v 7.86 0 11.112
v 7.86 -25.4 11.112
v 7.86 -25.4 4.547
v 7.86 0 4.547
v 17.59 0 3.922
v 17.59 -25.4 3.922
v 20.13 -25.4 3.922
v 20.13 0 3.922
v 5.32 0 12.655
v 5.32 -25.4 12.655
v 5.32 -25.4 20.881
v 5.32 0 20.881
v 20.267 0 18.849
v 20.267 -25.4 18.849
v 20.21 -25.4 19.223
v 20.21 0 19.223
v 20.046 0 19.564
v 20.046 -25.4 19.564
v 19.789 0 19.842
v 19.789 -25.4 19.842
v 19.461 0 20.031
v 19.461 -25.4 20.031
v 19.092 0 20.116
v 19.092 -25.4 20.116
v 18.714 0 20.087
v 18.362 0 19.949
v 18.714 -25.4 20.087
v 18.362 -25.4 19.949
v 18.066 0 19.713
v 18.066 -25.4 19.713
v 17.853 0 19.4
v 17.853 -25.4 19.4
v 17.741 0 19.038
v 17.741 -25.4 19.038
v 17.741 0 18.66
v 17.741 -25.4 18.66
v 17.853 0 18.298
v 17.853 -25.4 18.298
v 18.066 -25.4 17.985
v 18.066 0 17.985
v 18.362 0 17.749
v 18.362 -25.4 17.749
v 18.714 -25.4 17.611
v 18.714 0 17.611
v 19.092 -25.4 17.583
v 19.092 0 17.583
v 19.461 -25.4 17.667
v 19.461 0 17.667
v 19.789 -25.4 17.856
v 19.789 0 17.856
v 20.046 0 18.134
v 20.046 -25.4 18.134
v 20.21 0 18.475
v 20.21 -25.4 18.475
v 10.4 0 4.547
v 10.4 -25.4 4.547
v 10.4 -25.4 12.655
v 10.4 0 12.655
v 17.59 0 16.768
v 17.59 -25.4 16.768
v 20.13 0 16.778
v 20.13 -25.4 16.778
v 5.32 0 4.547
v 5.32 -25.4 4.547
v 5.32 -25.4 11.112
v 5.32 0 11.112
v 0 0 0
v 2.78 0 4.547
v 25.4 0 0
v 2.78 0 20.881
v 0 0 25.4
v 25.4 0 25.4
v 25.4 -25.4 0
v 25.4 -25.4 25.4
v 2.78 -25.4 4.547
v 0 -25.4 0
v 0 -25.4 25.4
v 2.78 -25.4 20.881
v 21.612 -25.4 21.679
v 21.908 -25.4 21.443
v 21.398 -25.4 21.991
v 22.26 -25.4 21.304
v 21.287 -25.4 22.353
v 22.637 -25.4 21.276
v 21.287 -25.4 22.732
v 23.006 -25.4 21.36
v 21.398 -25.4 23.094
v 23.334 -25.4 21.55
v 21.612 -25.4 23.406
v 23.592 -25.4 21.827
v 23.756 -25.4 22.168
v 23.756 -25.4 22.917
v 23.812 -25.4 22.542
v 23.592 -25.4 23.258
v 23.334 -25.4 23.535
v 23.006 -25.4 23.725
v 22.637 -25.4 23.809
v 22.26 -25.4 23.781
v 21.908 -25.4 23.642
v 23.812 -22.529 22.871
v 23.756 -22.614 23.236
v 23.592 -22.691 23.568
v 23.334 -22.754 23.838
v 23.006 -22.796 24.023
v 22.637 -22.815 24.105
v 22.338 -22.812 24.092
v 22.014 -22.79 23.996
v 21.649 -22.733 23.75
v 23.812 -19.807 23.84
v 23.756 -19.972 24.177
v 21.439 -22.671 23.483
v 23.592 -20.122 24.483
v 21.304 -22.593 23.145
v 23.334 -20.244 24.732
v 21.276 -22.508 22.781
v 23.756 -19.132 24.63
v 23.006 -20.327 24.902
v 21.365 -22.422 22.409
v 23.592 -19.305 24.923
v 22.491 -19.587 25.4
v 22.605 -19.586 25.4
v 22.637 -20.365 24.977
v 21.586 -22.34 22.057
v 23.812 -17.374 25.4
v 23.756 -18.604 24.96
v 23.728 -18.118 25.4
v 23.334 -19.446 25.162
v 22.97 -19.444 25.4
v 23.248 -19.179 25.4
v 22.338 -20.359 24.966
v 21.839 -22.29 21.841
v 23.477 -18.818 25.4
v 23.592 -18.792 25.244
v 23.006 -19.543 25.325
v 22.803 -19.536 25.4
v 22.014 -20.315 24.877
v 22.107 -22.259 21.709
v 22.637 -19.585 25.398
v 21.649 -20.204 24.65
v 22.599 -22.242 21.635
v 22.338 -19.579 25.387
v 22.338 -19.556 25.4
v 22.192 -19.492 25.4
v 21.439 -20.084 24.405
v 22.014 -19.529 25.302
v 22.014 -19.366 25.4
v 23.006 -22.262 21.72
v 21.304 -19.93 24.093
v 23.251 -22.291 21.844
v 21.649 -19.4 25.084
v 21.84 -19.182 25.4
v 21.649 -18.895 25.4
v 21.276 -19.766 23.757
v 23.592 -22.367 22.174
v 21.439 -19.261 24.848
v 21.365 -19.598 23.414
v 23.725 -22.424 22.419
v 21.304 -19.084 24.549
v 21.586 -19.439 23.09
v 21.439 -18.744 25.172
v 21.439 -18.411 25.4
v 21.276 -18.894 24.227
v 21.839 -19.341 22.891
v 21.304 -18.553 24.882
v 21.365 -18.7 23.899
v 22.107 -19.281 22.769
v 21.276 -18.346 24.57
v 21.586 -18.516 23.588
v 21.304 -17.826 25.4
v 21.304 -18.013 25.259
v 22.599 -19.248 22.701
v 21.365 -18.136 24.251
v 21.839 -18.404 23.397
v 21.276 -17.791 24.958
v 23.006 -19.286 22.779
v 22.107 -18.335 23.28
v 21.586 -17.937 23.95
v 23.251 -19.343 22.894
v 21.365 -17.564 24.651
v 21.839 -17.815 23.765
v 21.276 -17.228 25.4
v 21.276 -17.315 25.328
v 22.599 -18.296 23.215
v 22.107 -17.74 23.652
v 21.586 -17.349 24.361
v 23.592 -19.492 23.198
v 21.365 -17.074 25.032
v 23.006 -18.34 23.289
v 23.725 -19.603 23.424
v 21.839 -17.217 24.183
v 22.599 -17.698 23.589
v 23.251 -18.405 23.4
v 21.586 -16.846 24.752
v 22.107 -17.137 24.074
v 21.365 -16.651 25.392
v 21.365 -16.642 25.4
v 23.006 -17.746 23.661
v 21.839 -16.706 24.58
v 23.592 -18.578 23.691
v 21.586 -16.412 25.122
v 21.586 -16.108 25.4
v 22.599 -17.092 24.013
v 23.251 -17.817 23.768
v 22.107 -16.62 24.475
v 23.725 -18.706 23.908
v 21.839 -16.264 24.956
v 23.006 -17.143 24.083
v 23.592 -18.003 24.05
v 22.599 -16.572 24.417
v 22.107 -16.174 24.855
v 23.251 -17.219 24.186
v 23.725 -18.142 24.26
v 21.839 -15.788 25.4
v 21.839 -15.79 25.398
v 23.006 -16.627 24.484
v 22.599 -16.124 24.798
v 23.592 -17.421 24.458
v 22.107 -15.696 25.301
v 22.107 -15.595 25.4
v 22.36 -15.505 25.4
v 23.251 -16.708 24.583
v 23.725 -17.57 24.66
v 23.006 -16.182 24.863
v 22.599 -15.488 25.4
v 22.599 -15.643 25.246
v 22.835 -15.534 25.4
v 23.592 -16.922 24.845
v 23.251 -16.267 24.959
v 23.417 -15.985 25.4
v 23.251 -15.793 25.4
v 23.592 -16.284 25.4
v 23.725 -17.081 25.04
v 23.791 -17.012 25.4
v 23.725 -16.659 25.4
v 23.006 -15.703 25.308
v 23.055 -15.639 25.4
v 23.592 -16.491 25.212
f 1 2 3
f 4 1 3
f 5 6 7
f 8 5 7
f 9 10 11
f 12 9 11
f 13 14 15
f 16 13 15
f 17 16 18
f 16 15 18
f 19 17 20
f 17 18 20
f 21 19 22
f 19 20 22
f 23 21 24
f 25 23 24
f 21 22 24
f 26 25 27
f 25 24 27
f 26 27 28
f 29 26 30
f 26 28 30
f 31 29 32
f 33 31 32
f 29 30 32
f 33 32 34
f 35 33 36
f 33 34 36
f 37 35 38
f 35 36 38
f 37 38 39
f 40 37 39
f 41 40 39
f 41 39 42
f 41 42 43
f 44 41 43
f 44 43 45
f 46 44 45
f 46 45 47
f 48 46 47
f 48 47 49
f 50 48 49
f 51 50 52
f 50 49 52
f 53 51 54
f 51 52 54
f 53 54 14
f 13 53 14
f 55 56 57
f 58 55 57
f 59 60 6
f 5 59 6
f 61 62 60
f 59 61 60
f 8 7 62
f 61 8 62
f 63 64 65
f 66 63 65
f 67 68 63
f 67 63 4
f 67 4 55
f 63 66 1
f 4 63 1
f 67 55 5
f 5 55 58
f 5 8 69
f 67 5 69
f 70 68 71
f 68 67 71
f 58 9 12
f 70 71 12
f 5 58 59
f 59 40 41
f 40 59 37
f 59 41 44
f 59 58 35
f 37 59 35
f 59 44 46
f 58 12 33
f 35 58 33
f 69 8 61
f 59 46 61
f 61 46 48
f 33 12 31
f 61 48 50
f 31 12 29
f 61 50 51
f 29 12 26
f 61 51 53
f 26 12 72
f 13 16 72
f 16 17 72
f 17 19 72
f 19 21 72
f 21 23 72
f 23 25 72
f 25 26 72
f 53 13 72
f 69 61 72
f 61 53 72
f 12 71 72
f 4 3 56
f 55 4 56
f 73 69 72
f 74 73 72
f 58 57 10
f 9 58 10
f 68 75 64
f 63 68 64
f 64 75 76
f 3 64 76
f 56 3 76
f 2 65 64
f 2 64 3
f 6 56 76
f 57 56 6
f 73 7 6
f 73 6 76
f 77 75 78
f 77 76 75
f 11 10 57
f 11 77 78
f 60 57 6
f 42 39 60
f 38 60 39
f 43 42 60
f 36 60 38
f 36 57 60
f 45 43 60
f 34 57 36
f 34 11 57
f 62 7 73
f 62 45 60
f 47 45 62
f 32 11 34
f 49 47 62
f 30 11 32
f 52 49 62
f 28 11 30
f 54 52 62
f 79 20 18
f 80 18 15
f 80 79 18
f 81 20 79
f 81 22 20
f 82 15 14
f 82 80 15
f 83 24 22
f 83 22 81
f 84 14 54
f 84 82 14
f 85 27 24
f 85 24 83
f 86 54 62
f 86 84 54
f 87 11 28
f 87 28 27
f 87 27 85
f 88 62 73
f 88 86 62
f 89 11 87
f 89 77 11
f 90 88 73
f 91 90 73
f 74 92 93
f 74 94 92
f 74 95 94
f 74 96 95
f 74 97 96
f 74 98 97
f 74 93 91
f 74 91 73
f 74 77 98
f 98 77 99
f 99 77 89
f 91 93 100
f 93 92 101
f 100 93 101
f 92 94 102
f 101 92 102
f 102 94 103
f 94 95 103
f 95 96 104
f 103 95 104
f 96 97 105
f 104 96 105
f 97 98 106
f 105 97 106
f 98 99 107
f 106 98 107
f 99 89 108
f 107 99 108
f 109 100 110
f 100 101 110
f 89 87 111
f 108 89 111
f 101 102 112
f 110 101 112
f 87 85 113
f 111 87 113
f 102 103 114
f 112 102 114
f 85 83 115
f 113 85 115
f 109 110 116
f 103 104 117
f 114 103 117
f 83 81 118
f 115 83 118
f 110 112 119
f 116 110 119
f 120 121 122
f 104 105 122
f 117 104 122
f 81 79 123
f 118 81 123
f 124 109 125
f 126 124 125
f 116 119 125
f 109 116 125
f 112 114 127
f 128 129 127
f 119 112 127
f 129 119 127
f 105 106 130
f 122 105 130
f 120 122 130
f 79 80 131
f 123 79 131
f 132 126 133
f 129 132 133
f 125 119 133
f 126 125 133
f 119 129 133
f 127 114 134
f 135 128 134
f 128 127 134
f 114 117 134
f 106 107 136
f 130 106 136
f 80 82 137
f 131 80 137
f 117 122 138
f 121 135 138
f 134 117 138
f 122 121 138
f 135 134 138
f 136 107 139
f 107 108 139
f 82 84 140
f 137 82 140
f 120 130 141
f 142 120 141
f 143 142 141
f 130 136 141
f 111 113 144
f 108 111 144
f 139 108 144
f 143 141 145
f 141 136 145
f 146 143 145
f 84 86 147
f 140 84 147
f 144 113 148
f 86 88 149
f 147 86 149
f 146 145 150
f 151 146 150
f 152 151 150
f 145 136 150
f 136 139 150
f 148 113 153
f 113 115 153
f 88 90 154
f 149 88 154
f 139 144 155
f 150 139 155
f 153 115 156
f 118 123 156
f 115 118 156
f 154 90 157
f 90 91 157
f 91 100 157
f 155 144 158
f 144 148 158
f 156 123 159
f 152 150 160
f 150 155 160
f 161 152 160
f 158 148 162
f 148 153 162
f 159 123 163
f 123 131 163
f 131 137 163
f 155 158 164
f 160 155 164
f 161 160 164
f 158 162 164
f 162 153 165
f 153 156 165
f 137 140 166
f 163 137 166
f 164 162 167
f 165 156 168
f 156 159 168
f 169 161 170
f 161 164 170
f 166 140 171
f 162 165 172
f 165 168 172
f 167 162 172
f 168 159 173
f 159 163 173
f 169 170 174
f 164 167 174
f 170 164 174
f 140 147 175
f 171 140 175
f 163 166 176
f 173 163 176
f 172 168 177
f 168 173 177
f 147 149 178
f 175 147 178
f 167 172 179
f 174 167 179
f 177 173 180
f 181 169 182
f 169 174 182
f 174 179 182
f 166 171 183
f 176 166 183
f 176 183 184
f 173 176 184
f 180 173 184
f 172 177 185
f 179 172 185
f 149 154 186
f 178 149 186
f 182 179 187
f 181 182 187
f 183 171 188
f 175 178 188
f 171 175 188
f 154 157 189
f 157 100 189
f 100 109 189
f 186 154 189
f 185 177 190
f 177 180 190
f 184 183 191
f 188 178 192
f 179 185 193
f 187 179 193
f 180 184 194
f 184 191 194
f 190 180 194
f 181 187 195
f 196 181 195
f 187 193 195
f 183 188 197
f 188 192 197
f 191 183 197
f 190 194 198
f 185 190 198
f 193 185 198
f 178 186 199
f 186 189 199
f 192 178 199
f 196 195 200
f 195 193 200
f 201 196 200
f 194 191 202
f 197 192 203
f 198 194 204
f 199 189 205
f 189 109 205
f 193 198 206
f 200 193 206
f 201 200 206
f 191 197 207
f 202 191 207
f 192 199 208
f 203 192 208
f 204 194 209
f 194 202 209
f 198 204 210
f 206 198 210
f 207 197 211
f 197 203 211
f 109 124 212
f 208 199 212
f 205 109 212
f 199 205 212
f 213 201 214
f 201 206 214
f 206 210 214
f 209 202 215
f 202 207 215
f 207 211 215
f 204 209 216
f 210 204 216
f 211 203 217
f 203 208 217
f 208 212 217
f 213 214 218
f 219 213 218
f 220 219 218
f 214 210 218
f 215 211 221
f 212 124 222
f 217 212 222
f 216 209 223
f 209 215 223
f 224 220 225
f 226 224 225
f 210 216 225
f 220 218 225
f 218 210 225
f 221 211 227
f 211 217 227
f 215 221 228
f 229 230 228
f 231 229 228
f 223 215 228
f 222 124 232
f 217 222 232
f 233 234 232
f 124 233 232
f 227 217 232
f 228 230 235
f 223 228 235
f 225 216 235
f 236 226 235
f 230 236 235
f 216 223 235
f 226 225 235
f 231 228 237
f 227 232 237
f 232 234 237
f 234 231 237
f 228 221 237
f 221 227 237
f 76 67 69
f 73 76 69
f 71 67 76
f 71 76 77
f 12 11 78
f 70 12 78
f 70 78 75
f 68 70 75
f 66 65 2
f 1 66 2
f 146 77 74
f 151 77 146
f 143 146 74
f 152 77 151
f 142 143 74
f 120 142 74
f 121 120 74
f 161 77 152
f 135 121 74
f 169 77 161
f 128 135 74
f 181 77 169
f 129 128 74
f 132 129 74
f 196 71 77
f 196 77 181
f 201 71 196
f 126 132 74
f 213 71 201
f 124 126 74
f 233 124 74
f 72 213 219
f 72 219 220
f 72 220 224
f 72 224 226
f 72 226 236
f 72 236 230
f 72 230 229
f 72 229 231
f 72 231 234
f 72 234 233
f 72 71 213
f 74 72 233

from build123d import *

# Parameters (mm, degrees)
F0_W     = 25.4
F0_H     = 25.4
F1_DEPTH = 25.4
F2_R     = 1.27
F3_DEPTH = 25.4
F4_R     = 1.27


with BuildPart() as f1:
    # F0 (on Front) → F1 (new body)
    with BuildSketch(Plane.XZ):
        with Locations((12.7, 12.7)):
            Rectangle(F0_W, F0_H)
    extrude(amount=F1_DEPTH)

    # F2 (on face) → F3 (cut)
    with BuildSketch(Plane.XZ.offset(25.4)):
        Polygon((10.399874, 12.655389), (5.319874, 12.655389), (5.319874, 20.881082), (4.538336, 20.881082), (2.779874, 20.881082), (2.779874, 4.546927), (4.538336, 4.546927), (5.319874, 4.546927), (5.319874, 11.11185), (7.859874, 11.11185), (7.859874, 4.546927), (10.399874, 4.546927), align=None)
        Polygon((20.130028, 16.778005), (17.590028, 16.768235), (17.590028, 3.921696), (20.130028, 3.921696), align=None)
        with Locations((18.996799, 18.849081)):
            Circle(F2_R)
    extrude(amount=-F3_DEPTH, mode=Mode.SUBTRACT)

    # F4 (on face) → F5 (revolve, cut)
    with BuildSketch(Plane.XZ.offset(25.4)):
        with Locations((22.5425, 22.5425)):
            Circle(F4_R)
    revolve(axis=Axis((23.53713, -25.4, 35.2425), (1, 0, 0)), mode=Mode.SUBTRACT)


solid = f1.part
